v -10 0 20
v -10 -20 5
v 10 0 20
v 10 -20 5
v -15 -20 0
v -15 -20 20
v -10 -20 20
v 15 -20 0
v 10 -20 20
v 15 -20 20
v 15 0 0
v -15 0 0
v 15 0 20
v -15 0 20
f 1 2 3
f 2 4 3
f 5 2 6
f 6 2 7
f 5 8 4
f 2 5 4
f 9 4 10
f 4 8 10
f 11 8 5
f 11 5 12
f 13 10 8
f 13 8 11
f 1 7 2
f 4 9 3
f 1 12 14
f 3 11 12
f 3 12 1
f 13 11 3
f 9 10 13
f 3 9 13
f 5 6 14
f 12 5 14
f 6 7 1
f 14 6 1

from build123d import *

# Parameters (mm, degrees)
F0_W     = 20
F0_H     = 20
F1_DEPTH = 15
F3_DEPTH = 10


with BuildPart() as f1:
    # F0 (on Right) → F1 (new body, symmetric)
    with BuildSketch(Plane.YZ):
        with Locations((-10, 10)):
            Rectangle(F0_W, F0_H)
    extrude(amount=F1_DEPTH, both=True)

    # F2 (on Right) → F3 (cut, symmetric)
    with BuildSketch(Plane.YZ):
        Polygon((-20, 5), (0, 20), (-20, 20), align=None)
    extrude(amount=F3_DEPTH, both=True, mode=Mode.SUBTRACT)


solid = f1.part
